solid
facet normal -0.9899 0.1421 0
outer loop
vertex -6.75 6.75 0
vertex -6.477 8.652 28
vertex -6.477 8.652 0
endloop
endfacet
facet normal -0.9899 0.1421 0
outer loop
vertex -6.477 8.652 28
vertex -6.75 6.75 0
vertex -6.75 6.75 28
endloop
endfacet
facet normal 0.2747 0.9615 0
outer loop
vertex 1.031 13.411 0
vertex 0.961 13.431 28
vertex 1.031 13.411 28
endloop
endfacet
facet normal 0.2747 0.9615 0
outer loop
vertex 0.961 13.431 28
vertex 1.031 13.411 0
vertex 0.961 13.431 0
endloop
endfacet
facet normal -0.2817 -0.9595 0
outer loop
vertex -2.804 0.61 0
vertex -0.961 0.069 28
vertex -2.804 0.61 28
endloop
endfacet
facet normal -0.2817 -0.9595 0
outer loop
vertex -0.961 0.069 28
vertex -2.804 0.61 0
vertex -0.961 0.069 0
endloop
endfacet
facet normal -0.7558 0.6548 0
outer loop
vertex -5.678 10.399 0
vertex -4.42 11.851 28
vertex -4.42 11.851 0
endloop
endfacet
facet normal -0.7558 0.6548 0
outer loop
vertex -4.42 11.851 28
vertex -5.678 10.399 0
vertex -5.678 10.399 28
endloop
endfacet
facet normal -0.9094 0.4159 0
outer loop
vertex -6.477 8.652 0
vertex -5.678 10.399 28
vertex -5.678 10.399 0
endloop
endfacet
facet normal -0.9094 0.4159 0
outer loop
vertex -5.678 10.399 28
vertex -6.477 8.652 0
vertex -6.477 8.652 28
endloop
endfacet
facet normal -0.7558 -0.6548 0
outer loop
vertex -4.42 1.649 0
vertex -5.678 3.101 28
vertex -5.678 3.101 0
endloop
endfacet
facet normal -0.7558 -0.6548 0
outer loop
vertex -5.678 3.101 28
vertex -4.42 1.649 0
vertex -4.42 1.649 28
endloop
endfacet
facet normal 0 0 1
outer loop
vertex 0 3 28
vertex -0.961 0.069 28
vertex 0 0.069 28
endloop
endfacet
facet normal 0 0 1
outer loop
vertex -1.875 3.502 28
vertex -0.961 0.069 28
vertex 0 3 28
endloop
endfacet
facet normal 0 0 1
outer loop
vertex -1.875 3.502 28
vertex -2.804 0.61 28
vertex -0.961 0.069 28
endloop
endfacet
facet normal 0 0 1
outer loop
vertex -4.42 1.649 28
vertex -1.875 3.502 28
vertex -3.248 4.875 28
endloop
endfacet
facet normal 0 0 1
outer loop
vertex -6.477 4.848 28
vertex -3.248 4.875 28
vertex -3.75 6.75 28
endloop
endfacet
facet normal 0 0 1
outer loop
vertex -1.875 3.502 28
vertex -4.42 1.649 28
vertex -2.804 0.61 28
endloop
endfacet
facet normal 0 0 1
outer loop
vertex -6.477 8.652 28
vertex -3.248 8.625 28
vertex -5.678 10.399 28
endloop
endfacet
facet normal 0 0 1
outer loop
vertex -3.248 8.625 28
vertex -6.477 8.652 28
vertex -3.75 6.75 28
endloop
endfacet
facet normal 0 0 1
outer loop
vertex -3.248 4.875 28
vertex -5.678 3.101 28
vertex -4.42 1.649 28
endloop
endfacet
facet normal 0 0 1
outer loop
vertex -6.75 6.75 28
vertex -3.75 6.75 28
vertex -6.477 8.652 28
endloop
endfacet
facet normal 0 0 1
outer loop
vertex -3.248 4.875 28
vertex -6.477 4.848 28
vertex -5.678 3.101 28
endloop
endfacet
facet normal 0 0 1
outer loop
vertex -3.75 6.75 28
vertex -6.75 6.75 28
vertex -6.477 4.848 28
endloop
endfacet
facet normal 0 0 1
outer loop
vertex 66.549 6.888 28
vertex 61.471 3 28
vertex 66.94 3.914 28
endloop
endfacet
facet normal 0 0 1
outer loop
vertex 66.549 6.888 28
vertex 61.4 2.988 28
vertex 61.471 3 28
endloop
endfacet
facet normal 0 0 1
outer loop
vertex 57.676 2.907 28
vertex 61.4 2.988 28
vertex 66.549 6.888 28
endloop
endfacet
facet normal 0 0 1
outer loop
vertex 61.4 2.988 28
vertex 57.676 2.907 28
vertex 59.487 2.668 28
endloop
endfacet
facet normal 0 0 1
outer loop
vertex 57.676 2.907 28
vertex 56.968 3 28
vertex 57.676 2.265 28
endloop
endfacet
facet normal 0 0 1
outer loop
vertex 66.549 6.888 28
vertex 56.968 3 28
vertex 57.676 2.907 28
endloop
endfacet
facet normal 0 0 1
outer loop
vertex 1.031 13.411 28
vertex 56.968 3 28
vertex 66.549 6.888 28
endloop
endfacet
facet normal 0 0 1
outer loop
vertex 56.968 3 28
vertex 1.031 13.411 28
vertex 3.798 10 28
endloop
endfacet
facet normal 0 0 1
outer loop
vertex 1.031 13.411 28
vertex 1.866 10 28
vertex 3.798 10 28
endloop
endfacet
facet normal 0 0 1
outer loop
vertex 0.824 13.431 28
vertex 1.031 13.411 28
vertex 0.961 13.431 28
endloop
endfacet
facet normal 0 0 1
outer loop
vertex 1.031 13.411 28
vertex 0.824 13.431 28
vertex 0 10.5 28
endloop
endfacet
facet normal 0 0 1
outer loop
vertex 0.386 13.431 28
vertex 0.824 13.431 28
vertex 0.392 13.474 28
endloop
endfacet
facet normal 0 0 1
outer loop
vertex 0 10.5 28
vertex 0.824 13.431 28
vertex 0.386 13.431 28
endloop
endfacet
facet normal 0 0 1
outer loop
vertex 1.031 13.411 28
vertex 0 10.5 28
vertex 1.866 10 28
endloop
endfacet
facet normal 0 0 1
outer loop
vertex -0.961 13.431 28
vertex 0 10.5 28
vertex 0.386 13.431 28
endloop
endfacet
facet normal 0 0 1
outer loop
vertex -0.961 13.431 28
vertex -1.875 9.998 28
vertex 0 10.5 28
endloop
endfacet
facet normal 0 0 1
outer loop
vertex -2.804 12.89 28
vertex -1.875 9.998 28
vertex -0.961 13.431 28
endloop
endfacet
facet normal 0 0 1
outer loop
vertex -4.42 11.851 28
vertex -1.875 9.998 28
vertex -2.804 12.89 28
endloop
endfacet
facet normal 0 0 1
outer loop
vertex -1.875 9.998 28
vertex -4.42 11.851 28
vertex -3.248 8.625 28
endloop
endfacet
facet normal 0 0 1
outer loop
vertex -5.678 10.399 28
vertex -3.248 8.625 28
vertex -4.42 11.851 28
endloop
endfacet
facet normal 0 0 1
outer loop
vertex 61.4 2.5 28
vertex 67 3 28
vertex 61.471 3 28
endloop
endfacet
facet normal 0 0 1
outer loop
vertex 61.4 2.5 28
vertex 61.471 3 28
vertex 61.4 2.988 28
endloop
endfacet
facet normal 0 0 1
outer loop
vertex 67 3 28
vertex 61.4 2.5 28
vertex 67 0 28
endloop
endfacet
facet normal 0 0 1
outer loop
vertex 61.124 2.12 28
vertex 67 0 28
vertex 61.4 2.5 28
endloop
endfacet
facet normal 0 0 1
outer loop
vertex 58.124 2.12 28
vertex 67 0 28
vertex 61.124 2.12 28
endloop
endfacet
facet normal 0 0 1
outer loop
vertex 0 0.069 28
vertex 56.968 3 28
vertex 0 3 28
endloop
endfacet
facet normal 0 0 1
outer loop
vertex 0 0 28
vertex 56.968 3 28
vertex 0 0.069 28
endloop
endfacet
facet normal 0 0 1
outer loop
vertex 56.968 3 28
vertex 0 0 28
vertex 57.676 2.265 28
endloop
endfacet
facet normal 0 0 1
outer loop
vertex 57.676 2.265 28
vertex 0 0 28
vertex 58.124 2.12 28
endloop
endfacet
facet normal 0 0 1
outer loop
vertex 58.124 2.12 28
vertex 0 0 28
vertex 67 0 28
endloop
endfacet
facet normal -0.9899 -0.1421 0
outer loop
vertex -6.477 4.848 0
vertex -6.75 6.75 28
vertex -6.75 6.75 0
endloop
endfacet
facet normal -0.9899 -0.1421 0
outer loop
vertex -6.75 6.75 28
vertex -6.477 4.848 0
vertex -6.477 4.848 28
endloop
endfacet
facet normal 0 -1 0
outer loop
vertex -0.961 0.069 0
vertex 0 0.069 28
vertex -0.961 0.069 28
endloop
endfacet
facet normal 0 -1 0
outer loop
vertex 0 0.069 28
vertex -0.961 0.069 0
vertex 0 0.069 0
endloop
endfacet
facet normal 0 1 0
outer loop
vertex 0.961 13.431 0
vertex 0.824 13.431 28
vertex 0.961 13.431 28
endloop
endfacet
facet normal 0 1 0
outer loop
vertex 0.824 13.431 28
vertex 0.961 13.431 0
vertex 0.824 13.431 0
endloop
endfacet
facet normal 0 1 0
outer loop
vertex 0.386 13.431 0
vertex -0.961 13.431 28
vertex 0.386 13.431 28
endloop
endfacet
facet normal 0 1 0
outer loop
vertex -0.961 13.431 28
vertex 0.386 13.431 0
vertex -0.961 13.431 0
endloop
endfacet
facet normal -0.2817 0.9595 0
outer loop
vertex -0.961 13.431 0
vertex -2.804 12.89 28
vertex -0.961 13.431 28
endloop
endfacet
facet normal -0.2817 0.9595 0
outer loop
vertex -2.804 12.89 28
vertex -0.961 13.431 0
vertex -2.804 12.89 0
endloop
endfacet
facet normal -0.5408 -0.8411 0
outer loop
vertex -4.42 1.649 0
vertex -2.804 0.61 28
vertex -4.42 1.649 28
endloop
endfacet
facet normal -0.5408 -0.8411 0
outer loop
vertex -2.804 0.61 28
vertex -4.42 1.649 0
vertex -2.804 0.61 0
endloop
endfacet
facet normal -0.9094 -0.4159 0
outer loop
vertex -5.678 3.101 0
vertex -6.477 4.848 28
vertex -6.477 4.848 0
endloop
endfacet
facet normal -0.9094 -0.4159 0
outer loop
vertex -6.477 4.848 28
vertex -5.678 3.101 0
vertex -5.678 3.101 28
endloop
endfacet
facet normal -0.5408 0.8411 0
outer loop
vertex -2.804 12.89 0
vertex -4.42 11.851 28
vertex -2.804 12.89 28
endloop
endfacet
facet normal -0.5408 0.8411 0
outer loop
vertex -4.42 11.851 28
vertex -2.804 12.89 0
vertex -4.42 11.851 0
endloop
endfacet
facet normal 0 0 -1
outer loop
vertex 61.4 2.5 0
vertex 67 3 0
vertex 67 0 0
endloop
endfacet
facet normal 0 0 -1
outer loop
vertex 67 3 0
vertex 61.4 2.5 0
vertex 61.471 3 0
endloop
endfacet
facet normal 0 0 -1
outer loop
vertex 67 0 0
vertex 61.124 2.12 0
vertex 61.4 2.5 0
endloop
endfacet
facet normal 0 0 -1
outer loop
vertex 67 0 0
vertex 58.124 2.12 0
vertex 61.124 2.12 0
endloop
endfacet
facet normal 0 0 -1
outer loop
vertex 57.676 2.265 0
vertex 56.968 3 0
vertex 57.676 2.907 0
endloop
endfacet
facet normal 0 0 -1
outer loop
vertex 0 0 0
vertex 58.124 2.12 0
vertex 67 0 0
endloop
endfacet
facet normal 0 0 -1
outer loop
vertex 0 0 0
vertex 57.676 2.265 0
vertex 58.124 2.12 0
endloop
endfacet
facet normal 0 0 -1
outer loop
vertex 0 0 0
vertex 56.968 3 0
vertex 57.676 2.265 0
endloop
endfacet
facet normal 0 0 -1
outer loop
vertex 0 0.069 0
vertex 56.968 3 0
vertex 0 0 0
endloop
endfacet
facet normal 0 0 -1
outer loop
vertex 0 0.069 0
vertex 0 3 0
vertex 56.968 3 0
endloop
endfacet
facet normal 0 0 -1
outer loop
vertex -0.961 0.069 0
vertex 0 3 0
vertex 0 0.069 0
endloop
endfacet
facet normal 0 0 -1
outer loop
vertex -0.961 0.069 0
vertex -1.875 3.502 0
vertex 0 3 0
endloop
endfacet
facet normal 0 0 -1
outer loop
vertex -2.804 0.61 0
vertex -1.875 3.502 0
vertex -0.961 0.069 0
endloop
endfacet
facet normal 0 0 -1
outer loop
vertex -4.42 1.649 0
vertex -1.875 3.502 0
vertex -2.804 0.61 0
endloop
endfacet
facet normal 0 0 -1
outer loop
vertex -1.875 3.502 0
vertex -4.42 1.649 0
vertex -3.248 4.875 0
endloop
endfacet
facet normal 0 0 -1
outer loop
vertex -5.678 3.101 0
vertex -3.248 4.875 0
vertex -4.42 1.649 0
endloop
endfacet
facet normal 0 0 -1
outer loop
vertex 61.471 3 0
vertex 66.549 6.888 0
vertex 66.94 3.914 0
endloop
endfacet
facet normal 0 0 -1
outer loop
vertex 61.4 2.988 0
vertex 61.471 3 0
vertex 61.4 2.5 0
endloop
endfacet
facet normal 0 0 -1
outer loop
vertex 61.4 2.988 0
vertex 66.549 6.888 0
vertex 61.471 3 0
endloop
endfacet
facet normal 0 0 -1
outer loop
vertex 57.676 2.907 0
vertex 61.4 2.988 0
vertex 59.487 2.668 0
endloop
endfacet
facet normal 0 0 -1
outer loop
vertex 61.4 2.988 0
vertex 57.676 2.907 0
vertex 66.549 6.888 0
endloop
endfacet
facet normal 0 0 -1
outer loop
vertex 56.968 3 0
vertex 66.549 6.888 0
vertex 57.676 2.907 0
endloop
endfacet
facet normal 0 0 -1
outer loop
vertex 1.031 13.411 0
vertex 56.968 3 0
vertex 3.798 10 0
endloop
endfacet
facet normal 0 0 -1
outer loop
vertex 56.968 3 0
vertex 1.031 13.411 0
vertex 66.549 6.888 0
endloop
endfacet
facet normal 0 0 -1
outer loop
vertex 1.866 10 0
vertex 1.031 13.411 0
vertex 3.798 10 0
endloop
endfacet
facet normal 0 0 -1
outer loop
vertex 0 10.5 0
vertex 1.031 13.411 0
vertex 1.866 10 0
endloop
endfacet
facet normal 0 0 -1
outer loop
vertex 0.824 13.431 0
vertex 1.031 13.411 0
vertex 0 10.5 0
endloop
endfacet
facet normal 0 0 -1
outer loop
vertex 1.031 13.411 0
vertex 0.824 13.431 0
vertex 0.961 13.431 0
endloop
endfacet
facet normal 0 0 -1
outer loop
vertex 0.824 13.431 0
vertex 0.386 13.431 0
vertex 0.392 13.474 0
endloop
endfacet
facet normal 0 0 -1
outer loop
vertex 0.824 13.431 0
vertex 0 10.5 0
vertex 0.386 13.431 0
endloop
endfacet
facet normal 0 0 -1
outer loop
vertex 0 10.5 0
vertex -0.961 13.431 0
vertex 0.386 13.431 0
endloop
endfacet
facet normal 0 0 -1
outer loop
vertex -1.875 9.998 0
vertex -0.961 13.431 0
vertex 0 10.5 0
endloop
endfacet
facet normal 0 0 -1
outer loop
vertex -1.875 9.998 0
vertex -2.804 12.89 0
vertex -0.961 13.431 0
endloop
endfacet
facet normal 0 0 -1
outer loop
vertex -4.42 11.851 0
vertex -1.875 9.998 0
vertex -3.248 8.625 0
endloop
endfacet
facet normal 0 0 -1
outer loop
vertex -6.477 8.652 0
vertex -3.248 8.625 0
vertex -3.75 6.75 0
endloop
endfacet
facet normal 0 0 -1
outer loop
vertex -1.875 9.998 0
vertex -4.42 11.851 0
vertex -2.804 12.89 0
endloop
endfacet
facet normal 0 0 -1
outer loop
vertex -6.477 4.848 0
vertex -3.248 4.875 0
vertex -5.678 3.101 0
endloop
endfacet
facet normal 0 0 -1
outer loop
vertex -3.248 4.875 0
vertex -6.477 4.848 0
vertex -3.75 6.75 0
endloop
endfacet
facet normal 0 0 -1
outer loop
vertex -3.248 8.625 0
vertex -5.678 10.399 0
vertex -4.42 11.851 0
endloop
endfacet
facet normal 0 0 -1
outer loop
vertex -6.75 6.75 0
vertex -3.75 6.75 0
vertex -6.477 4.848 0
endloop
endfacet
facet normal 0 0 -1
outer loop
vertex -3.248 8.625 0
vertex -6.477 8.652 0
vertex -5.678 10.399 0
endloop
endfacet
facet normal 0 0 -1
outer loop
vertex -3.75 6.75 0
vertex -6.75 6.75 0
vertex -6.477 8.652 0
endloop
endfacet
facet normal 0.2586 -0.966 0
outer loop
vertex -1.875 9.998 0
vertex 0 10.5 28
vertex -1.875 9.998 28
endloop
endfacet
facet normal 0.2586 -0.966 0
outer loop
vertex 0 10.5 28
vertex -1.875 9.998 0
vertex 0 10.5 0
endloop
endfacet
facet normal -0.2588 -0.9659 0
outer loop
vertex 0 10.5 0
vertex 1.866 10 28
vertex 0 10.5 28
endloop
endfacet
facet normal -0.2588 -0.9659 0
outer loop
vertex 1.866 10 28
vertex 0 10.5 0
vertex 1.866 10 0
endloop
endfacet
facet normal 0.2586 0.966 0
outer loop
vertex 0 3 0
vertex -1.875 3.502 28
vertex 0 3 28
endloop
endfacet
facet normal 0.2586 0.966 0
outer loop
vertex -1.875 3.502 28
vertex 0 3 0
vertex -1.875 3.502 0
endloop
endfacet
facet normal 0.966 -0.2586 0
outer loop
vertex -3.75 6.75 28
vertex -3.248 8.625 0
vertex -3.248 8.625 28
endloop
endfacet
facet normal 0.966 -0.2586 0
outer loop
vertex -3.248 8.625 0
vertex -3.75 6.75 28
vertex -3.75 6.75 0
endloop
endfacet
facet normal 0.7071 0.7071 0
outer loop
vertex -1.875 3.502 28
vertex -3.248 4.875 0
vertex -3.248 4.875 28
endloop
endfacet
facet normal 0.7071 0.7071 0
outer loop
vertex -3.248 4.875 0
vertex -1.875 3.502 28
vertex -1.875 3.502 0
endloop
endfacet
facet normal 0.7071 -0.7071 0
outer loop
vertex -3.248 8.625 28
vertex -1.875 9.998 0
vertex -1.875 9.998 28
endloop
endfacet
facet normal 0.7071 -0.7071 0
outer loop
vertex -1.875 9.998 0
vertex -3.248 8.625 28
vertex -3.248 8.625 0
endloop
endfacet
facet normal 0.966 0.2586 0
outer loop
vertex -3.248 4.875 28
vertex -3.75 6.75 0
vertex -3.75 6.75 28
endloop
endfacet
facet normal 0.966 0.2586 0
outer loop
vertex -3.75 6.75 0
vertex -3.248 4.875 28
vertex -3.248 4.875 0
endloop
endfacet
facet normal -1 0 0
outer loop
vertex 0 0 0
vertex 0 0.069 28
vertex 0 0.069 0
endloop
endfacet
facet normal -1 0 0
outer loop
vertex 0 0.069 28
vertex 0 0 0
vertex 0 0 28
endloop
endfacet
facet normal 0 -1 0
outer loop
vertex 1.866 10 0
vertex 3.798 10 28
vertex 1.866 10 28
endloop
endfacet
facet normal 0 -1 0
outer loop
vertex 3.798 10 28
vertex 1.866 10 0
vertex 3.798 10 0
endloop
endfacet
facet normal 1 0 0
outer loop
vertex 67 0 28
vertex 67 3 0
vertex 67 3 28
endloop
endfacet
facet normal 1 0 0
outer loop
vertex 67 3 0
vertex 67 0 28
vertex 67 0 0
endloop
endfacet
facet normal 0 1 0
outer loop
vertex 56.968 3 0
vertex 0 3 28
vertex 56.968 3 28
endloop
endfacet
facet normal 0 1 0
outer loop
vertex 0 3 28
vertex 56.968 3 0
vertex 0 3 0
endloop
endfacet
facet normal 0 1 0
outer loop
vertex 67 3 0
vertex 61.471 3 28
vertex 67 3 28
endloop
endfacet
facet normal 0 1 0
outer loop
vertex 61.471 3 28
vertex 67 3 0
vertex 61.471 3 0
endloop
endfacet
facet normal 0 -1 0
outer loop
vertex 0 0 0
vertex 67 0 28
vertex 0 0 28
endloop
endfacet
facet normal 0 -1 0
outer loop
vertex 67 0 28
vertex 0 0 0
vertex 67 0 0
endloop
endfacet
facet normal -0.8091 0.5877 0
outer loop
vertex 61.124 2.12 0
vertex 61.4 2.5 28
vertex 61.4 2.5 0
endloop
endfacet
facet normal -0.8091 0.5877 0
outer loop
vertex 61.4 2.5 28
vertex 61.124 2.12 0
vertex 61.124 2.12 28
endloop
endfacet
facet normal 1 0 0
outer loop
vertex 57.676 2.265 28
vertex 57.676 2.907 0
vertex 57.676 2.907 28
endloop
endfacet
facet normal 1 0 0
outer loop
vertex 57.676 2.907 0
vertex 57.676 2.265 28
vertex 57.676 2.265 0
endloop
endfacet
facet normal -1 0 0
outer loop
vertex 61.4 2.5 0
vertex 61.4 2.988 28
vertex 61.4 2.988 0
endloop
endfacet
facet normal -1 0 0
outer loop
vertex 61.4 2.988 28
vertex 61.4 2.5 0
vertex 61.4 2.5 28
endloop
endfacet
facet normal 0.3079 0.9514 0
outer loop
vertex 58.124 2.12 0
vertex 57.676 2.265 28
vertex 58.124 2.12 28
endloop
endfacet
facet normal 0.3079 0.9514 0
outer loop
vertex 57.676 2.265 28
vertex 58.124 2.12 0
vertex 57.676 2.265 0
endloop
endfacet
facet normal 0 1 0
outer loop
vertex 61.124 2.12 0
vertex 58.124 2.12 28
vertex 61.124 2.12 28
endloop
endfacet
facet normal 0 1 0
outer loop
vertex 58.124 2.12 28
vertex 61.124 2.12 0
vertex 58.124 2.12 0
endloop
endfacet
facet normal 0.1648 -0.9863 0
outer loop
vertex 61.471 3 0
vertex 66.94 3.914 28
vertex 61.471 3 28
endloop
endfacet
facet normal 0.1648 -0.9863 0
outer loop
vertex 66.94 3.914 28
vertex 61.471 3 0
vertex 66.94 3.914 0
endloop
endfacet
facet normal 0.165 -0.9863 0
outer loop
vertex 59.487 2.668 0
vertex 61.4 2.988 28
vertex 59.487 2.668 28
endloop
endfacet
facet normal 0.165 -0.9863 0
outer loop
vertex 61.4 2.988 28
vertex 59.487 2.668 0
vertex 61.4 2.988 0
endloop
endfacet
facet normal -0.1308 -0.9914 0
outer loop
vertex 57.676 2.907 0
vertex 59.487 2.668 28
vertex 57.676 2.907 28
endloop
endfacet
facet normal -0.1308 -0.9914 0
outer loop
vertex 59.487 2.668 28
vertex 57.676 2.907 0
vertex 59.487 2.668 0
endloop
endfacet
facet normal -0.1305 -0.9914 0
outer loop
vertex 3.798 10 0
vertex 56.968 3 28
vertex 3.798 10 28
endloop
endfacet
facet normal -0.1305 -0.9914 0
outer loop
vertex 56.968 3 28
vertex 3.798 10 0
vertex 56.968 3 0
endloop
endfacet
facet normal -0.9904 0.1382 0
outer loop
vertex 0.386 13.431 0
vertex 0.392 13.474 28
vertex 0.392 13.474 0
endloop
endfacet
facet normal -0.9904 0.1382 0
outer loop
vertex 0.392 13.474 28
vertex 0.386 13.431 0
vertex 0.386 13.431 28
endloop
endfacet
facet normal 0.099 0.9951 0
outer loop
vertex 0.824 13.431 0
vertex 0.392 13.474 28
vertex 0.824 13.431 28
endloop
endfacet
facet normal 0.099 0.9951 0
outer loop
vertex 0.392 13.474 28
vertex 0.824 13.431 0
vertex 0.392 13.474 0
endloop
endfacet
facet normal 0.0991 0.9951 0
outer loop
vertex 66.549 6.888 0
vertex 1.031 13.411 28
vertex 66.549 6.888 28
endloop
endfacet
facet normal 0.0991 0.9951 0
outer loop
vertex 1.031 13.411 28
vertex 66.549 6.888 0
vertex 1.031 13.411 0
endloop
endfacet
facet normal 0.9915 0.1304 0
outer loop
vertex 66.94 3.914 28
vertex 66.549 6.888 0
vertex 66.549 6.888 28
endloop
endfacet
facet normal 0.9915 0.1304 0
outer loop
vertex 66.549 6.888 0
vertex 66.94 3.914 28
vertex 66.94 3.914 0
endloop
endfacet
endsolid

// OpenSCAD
// a $50,000.00 plastic printing machine was once used to print these. as demo
//models.

//moneyclip.

// description:
//moneyclip has a front surface along the X axis lets say, then a wide curve and
//another straight segment at some angle wrt the X axis.  there is a friction
//section at the mouth, with a raised rectangle on one side and a matching
//recessed rectangle on the other there's a surface for text on the outside along
//the X axis so its easy to orient

// proceedure:
// build with a polyline, extrude vertically,
// manually place the text section using boolean operations
// place the friction part.

// Dimensions in mm
eps=0.1;
height = 28.0; // narrow side
width = 67;
depth = 5; 
thickness = 3;


  difference(){
  translate([0,13.5/2,0])cylinder(r=13.5/2,h=28);
  translate([0,13.5/2,-eps/2])cylinder(r=13.5/2-3,h=28+eps);
  translate([0,0,-5])cube([10,10.0,45]);
  }

difference(){
  difference(){
  cube([67,3,28]);
  minkowski(){
  sphere(r=0.4);
  translate([58,2.5,-3.5])cube([3,0.6,35]);
  }
  }
  hull(){
    scale([1.0,1.0,1.0])translate([0,13.5-3+eps,0])rotate(-7.5)cube([60,3,28]);
    scale([1.0,1.0,1.0])translate([60,3+eps,0])rotate(7.5)cube([7,3,28]);
    }
 }


  hull(){
  translate([0,13.5-3,0])rotate(-7.5)cube([60,3,28]);
  translate([60,3,0])rotate(7.5)cube([7,3,28]);
  }
